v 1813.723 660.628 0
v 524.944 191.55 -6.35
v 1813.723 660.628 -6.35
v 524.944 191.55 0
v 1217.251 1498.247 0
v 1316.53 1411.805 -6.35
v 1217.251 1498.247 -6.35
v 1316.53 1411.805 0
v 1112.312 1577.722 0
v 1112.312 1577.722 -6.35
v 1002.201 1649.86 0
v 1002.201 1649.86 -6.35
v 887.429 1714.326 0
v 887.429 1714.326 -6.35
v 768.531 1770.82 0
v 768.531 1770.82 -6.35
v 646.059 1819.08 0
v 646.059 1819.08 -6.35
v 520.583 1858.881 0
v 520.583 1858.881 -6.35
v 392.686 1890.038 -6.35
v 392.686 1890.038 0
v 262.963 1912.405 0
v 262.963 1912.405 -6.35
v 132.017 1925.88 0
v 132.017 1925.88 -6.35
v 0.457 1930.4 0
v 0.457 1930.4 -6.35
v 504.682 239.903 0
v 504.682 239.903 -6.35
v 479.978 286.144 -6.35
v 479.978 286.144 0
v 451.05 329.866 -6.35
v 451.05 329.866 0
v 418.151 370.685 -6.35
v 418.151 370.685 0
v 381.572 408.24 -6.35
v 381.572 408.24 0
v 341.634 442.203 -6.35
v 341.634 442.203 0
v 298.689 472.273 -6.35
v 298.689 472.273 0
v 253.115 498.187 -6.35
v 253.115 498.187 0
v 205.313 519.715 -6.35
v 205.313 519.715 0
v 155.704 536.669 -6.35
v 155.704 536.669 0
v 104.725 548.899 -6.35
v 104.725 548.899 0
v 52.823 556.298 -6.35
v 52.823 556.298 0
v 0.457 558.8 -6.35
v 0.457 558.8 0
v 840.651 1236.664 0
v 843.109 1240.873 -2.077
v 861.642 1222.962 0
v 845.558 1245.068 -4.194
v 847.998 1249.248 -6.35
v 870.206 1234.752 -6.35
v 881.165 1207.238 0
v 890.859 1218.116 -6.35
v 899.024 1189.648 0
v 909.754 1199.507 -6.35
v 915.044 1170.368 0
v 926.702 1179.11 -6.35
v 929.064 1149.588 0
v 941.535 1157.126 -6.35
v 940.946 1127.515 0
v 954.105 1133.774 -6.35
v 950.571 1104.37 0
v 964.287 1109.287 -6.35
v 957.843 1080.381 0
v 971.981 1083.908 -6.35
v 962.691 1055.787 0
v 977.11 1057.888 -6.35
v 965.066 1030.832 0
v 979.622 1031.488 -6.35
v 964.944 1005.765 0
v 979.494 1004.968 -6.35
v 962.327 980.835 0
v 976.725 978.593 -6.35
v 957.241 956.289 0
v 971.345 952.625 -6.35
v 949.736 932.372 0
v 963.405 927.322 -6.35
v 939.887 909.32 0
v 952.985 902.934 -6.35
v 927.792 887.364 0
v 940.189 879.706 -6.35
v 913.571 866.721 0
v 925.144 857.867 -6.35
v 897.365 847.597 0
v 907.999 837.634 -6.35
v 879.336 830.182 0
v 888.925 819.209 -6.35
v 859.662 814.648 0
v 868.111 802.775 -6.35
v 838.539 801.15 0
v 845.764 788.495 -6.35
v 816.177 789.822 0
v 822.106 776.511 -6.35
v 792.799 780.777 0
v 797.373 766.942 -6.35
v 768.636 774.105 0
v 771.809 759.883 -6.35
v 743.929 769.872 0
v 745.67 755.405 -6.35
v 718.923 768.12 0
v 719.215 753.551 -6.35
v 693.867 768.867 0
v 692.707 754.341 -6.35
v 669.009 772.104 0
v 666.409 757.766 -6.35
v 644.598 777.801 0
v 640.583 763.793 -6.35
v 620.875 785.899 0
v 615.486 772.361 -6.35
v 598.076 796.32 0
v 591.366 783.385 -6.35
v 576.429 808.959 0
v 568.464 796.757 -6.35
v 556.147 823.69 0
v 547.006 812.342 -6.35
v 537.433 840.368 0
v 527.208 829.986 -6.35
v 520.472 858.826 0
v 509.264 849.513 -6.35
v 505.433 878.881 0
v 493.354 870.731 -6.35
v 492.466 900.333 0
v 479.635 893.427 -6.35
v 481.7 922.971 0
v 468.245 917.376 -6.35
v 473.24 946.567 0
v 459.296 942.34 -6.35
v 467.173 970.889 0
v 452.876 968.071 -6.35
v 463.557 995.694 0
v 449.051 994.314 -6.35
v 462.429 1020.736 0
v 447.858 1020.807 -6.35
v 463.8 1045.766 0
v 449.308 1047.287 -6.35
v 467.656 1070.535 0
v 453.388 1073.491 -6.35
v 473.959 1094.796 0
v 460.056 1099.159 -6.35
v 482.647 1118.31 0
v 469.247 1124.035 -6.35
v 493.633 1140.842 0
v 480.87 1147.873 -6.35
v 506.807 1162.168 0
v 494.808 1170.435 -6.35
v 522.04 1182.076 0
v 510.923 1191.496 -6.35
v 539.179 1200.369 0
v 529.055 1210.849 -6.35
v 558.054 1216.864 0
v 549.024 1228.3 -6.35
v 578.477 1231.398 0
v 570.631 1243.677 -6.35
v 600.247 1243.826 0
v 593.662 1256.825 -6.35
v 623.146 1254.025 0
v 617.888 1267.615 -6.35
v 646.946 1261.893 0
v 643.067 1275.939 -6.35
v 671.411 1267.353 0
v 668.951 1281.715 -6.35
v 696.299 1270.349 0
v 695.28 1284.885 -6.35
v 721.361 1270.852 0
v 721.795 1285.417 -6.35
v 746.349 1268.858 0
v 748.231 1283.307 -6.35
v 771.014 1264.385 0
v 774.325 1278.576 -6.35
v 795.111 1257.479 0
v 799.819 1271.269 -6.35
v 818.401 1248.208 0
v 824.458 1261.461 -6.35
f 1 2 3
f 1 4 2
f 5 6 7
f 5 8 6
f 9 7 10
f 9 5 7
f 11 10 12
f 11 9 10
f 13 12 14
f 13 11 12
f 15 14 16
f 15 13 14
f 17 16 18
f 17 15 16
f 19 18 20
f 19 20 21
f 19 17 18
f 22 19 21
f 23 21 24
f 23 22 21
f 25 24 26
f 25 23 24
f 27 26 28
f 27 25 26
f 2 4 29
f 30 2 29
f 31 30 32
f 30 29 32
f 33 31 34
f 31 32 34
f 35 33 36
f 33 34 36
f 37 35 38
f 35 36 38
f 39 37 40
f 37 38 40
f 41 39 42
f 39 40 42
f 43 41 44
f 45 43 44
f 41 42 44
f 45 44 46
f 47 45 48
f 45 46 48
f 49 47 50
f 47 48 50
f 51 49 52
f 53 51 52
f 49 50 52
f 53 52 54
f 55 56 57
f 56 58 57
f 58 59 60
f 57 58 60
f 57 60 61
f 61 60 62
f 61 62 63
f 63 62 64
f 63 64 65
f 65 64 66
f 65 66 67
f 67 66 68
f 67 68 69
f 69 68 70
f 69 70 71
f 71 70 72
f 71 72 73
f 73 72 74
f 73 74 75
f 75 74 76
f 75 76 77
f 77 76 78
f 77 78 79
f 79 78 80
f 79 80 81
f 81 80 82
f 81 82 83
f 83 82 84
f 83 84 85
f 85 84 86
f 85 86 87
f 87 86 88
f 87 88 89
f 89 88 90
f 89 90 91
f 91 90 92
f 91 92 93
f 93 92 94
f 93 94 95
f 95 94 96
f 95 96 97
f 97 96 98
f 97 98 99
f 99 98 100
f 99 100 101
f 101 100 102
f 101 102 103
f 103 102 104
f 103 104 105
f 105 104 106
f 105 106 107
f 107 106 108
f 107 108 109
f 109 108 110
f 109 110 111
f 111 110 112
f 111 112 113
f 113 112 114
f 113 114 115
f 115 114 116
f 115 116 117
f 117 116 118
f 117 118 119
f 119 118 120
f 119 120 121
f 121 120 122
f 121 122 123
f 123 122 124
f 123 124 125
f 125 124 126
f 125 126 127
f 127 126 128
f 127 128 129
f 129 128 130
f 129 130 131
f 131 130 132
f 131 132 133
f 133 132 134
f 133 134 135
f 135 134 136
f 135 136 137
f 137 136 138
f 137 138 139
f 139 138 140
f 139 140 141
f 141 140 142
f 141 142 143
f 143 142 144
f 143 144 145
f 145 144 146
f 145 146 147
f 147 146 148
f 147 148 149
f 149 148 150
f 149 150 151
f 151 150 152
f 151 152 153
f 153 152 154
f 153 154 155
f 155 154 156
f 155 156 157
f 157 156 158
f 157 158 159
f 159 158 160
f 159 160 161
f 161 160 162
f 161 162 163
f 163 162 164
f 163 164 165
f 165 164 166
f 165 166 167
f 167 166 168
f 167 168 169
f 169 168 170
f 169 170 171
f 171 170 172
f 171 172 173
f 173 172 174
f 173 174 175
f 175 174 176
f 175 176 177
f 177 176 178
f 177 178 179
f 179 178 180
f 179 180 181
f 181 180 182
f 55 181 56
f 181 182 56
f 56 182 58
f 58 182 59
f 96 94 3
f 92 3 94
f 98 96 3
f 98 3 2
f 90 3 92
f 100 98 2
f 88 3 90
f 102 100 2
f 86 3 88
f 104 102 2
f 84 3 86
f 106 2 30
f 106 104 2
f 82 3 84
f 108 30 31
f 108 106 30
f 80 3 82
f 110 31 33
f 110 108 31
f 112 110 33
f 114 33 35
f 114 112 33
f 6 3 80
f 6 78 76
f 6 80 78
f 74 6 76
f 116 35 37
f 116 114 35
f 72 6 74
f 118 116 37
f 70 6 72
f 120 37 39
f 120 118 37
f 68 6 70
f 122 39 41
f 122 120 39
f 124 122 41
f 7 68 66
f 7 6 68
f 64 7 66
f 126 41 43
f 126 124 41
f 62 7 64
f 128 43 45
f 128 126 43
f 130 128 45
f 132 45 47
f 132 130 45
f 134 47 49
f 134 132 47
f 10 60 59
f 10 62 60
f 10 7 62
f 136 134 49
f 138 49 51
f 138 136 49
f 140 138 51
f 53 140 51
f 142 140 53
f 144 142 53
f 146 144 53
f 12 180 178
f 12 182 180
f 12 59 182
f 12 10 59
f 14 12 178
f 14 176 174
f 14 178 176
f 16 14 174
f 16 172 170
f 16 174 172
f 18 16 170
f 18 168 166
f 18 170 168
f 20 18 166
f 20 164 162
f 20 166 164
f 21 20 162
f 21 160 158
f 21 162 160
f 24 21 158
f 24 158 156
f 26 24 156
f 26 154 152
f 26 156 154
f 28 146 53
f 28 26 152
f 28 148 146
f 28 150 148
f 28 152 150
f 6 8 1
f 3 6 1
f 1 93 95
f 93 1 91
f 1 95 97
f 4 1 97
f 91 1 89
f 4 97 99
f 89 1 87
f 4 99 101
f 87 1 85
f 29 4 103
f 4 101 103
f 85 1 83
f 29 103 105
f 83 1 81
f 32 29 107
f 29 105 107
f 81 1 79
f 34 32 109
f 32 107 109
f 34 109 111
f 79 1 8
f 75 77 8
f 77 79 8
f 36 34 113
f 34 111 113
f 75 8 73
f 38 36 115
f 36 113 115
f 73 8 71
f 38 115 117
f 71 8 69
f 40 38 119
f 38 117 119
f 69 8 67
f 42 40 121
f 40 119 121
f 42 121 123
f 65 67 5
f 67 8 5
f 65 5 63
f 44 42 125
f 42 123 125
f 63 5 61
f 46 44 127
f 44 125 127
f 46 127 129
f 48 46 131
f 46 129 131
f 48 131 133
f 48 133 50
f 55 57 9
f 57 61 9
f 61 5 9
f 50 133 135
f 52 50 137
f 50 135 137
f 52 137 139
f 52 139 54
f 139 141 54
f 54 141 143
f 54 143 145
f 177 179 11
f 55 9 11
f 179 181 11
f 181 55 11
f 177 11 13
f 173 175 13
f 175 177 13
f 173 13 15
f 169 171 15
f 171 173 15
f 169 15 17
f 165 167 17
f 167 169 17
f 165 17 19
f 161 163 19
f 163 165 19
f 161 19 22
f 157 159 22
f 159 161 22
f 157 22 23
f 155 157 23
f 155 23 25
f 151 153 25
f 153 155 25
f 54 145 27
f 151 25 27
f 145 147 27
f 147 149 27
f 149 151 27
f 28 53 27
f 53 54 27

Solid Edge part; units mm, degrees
sketch "Sketch1" plane through (0, 0, 0) normal (0, 0, 1) x (1, 0, 0)
  line L0 (0.4572, 558.7998) -> (0.4572, 1930.3999)
  arc A0 (1107.232, 1581.2911) -> (0.4572, 1930.3999) centre (0, 0) ccw
  arc A1 (1316.5296, 1411.8052) -> (1107.232, 1581.2911) centre (0, 0) ccw
  line L1 (1316.5296, 1411.8052) -> (1813.7231, 660.6278)
  line L2 (524.9437, 191.5504) -> (1813.7231, 660.6278)
  arc A2 (524.9437, 191.5504) -> (0.4572, 558.7998) centre (0, 0) ccw
extrude "Protrusion1" add sketch "Sketch1" against normal blind 6.35
sketch "Sketch2" plane through (713.8732, 1019.5166, 0) normal (0.8636, -0.5042, 0) x (0.5042, 0.8636, 0)
  arc A0 (0, 50.8) -> (647.7, -596.9) centre (0, -596.9) cw
  line L0 (647.7, -596.9) -> (0, -596.9)
  line L1 (0, -596.9) -> (0, 50.8)
revolve "RevolvedCutout1" cut sketch "Sketch2" angle 360 about axis through (713.8732, 1019.5166, 0) along (0, 0, -1)
